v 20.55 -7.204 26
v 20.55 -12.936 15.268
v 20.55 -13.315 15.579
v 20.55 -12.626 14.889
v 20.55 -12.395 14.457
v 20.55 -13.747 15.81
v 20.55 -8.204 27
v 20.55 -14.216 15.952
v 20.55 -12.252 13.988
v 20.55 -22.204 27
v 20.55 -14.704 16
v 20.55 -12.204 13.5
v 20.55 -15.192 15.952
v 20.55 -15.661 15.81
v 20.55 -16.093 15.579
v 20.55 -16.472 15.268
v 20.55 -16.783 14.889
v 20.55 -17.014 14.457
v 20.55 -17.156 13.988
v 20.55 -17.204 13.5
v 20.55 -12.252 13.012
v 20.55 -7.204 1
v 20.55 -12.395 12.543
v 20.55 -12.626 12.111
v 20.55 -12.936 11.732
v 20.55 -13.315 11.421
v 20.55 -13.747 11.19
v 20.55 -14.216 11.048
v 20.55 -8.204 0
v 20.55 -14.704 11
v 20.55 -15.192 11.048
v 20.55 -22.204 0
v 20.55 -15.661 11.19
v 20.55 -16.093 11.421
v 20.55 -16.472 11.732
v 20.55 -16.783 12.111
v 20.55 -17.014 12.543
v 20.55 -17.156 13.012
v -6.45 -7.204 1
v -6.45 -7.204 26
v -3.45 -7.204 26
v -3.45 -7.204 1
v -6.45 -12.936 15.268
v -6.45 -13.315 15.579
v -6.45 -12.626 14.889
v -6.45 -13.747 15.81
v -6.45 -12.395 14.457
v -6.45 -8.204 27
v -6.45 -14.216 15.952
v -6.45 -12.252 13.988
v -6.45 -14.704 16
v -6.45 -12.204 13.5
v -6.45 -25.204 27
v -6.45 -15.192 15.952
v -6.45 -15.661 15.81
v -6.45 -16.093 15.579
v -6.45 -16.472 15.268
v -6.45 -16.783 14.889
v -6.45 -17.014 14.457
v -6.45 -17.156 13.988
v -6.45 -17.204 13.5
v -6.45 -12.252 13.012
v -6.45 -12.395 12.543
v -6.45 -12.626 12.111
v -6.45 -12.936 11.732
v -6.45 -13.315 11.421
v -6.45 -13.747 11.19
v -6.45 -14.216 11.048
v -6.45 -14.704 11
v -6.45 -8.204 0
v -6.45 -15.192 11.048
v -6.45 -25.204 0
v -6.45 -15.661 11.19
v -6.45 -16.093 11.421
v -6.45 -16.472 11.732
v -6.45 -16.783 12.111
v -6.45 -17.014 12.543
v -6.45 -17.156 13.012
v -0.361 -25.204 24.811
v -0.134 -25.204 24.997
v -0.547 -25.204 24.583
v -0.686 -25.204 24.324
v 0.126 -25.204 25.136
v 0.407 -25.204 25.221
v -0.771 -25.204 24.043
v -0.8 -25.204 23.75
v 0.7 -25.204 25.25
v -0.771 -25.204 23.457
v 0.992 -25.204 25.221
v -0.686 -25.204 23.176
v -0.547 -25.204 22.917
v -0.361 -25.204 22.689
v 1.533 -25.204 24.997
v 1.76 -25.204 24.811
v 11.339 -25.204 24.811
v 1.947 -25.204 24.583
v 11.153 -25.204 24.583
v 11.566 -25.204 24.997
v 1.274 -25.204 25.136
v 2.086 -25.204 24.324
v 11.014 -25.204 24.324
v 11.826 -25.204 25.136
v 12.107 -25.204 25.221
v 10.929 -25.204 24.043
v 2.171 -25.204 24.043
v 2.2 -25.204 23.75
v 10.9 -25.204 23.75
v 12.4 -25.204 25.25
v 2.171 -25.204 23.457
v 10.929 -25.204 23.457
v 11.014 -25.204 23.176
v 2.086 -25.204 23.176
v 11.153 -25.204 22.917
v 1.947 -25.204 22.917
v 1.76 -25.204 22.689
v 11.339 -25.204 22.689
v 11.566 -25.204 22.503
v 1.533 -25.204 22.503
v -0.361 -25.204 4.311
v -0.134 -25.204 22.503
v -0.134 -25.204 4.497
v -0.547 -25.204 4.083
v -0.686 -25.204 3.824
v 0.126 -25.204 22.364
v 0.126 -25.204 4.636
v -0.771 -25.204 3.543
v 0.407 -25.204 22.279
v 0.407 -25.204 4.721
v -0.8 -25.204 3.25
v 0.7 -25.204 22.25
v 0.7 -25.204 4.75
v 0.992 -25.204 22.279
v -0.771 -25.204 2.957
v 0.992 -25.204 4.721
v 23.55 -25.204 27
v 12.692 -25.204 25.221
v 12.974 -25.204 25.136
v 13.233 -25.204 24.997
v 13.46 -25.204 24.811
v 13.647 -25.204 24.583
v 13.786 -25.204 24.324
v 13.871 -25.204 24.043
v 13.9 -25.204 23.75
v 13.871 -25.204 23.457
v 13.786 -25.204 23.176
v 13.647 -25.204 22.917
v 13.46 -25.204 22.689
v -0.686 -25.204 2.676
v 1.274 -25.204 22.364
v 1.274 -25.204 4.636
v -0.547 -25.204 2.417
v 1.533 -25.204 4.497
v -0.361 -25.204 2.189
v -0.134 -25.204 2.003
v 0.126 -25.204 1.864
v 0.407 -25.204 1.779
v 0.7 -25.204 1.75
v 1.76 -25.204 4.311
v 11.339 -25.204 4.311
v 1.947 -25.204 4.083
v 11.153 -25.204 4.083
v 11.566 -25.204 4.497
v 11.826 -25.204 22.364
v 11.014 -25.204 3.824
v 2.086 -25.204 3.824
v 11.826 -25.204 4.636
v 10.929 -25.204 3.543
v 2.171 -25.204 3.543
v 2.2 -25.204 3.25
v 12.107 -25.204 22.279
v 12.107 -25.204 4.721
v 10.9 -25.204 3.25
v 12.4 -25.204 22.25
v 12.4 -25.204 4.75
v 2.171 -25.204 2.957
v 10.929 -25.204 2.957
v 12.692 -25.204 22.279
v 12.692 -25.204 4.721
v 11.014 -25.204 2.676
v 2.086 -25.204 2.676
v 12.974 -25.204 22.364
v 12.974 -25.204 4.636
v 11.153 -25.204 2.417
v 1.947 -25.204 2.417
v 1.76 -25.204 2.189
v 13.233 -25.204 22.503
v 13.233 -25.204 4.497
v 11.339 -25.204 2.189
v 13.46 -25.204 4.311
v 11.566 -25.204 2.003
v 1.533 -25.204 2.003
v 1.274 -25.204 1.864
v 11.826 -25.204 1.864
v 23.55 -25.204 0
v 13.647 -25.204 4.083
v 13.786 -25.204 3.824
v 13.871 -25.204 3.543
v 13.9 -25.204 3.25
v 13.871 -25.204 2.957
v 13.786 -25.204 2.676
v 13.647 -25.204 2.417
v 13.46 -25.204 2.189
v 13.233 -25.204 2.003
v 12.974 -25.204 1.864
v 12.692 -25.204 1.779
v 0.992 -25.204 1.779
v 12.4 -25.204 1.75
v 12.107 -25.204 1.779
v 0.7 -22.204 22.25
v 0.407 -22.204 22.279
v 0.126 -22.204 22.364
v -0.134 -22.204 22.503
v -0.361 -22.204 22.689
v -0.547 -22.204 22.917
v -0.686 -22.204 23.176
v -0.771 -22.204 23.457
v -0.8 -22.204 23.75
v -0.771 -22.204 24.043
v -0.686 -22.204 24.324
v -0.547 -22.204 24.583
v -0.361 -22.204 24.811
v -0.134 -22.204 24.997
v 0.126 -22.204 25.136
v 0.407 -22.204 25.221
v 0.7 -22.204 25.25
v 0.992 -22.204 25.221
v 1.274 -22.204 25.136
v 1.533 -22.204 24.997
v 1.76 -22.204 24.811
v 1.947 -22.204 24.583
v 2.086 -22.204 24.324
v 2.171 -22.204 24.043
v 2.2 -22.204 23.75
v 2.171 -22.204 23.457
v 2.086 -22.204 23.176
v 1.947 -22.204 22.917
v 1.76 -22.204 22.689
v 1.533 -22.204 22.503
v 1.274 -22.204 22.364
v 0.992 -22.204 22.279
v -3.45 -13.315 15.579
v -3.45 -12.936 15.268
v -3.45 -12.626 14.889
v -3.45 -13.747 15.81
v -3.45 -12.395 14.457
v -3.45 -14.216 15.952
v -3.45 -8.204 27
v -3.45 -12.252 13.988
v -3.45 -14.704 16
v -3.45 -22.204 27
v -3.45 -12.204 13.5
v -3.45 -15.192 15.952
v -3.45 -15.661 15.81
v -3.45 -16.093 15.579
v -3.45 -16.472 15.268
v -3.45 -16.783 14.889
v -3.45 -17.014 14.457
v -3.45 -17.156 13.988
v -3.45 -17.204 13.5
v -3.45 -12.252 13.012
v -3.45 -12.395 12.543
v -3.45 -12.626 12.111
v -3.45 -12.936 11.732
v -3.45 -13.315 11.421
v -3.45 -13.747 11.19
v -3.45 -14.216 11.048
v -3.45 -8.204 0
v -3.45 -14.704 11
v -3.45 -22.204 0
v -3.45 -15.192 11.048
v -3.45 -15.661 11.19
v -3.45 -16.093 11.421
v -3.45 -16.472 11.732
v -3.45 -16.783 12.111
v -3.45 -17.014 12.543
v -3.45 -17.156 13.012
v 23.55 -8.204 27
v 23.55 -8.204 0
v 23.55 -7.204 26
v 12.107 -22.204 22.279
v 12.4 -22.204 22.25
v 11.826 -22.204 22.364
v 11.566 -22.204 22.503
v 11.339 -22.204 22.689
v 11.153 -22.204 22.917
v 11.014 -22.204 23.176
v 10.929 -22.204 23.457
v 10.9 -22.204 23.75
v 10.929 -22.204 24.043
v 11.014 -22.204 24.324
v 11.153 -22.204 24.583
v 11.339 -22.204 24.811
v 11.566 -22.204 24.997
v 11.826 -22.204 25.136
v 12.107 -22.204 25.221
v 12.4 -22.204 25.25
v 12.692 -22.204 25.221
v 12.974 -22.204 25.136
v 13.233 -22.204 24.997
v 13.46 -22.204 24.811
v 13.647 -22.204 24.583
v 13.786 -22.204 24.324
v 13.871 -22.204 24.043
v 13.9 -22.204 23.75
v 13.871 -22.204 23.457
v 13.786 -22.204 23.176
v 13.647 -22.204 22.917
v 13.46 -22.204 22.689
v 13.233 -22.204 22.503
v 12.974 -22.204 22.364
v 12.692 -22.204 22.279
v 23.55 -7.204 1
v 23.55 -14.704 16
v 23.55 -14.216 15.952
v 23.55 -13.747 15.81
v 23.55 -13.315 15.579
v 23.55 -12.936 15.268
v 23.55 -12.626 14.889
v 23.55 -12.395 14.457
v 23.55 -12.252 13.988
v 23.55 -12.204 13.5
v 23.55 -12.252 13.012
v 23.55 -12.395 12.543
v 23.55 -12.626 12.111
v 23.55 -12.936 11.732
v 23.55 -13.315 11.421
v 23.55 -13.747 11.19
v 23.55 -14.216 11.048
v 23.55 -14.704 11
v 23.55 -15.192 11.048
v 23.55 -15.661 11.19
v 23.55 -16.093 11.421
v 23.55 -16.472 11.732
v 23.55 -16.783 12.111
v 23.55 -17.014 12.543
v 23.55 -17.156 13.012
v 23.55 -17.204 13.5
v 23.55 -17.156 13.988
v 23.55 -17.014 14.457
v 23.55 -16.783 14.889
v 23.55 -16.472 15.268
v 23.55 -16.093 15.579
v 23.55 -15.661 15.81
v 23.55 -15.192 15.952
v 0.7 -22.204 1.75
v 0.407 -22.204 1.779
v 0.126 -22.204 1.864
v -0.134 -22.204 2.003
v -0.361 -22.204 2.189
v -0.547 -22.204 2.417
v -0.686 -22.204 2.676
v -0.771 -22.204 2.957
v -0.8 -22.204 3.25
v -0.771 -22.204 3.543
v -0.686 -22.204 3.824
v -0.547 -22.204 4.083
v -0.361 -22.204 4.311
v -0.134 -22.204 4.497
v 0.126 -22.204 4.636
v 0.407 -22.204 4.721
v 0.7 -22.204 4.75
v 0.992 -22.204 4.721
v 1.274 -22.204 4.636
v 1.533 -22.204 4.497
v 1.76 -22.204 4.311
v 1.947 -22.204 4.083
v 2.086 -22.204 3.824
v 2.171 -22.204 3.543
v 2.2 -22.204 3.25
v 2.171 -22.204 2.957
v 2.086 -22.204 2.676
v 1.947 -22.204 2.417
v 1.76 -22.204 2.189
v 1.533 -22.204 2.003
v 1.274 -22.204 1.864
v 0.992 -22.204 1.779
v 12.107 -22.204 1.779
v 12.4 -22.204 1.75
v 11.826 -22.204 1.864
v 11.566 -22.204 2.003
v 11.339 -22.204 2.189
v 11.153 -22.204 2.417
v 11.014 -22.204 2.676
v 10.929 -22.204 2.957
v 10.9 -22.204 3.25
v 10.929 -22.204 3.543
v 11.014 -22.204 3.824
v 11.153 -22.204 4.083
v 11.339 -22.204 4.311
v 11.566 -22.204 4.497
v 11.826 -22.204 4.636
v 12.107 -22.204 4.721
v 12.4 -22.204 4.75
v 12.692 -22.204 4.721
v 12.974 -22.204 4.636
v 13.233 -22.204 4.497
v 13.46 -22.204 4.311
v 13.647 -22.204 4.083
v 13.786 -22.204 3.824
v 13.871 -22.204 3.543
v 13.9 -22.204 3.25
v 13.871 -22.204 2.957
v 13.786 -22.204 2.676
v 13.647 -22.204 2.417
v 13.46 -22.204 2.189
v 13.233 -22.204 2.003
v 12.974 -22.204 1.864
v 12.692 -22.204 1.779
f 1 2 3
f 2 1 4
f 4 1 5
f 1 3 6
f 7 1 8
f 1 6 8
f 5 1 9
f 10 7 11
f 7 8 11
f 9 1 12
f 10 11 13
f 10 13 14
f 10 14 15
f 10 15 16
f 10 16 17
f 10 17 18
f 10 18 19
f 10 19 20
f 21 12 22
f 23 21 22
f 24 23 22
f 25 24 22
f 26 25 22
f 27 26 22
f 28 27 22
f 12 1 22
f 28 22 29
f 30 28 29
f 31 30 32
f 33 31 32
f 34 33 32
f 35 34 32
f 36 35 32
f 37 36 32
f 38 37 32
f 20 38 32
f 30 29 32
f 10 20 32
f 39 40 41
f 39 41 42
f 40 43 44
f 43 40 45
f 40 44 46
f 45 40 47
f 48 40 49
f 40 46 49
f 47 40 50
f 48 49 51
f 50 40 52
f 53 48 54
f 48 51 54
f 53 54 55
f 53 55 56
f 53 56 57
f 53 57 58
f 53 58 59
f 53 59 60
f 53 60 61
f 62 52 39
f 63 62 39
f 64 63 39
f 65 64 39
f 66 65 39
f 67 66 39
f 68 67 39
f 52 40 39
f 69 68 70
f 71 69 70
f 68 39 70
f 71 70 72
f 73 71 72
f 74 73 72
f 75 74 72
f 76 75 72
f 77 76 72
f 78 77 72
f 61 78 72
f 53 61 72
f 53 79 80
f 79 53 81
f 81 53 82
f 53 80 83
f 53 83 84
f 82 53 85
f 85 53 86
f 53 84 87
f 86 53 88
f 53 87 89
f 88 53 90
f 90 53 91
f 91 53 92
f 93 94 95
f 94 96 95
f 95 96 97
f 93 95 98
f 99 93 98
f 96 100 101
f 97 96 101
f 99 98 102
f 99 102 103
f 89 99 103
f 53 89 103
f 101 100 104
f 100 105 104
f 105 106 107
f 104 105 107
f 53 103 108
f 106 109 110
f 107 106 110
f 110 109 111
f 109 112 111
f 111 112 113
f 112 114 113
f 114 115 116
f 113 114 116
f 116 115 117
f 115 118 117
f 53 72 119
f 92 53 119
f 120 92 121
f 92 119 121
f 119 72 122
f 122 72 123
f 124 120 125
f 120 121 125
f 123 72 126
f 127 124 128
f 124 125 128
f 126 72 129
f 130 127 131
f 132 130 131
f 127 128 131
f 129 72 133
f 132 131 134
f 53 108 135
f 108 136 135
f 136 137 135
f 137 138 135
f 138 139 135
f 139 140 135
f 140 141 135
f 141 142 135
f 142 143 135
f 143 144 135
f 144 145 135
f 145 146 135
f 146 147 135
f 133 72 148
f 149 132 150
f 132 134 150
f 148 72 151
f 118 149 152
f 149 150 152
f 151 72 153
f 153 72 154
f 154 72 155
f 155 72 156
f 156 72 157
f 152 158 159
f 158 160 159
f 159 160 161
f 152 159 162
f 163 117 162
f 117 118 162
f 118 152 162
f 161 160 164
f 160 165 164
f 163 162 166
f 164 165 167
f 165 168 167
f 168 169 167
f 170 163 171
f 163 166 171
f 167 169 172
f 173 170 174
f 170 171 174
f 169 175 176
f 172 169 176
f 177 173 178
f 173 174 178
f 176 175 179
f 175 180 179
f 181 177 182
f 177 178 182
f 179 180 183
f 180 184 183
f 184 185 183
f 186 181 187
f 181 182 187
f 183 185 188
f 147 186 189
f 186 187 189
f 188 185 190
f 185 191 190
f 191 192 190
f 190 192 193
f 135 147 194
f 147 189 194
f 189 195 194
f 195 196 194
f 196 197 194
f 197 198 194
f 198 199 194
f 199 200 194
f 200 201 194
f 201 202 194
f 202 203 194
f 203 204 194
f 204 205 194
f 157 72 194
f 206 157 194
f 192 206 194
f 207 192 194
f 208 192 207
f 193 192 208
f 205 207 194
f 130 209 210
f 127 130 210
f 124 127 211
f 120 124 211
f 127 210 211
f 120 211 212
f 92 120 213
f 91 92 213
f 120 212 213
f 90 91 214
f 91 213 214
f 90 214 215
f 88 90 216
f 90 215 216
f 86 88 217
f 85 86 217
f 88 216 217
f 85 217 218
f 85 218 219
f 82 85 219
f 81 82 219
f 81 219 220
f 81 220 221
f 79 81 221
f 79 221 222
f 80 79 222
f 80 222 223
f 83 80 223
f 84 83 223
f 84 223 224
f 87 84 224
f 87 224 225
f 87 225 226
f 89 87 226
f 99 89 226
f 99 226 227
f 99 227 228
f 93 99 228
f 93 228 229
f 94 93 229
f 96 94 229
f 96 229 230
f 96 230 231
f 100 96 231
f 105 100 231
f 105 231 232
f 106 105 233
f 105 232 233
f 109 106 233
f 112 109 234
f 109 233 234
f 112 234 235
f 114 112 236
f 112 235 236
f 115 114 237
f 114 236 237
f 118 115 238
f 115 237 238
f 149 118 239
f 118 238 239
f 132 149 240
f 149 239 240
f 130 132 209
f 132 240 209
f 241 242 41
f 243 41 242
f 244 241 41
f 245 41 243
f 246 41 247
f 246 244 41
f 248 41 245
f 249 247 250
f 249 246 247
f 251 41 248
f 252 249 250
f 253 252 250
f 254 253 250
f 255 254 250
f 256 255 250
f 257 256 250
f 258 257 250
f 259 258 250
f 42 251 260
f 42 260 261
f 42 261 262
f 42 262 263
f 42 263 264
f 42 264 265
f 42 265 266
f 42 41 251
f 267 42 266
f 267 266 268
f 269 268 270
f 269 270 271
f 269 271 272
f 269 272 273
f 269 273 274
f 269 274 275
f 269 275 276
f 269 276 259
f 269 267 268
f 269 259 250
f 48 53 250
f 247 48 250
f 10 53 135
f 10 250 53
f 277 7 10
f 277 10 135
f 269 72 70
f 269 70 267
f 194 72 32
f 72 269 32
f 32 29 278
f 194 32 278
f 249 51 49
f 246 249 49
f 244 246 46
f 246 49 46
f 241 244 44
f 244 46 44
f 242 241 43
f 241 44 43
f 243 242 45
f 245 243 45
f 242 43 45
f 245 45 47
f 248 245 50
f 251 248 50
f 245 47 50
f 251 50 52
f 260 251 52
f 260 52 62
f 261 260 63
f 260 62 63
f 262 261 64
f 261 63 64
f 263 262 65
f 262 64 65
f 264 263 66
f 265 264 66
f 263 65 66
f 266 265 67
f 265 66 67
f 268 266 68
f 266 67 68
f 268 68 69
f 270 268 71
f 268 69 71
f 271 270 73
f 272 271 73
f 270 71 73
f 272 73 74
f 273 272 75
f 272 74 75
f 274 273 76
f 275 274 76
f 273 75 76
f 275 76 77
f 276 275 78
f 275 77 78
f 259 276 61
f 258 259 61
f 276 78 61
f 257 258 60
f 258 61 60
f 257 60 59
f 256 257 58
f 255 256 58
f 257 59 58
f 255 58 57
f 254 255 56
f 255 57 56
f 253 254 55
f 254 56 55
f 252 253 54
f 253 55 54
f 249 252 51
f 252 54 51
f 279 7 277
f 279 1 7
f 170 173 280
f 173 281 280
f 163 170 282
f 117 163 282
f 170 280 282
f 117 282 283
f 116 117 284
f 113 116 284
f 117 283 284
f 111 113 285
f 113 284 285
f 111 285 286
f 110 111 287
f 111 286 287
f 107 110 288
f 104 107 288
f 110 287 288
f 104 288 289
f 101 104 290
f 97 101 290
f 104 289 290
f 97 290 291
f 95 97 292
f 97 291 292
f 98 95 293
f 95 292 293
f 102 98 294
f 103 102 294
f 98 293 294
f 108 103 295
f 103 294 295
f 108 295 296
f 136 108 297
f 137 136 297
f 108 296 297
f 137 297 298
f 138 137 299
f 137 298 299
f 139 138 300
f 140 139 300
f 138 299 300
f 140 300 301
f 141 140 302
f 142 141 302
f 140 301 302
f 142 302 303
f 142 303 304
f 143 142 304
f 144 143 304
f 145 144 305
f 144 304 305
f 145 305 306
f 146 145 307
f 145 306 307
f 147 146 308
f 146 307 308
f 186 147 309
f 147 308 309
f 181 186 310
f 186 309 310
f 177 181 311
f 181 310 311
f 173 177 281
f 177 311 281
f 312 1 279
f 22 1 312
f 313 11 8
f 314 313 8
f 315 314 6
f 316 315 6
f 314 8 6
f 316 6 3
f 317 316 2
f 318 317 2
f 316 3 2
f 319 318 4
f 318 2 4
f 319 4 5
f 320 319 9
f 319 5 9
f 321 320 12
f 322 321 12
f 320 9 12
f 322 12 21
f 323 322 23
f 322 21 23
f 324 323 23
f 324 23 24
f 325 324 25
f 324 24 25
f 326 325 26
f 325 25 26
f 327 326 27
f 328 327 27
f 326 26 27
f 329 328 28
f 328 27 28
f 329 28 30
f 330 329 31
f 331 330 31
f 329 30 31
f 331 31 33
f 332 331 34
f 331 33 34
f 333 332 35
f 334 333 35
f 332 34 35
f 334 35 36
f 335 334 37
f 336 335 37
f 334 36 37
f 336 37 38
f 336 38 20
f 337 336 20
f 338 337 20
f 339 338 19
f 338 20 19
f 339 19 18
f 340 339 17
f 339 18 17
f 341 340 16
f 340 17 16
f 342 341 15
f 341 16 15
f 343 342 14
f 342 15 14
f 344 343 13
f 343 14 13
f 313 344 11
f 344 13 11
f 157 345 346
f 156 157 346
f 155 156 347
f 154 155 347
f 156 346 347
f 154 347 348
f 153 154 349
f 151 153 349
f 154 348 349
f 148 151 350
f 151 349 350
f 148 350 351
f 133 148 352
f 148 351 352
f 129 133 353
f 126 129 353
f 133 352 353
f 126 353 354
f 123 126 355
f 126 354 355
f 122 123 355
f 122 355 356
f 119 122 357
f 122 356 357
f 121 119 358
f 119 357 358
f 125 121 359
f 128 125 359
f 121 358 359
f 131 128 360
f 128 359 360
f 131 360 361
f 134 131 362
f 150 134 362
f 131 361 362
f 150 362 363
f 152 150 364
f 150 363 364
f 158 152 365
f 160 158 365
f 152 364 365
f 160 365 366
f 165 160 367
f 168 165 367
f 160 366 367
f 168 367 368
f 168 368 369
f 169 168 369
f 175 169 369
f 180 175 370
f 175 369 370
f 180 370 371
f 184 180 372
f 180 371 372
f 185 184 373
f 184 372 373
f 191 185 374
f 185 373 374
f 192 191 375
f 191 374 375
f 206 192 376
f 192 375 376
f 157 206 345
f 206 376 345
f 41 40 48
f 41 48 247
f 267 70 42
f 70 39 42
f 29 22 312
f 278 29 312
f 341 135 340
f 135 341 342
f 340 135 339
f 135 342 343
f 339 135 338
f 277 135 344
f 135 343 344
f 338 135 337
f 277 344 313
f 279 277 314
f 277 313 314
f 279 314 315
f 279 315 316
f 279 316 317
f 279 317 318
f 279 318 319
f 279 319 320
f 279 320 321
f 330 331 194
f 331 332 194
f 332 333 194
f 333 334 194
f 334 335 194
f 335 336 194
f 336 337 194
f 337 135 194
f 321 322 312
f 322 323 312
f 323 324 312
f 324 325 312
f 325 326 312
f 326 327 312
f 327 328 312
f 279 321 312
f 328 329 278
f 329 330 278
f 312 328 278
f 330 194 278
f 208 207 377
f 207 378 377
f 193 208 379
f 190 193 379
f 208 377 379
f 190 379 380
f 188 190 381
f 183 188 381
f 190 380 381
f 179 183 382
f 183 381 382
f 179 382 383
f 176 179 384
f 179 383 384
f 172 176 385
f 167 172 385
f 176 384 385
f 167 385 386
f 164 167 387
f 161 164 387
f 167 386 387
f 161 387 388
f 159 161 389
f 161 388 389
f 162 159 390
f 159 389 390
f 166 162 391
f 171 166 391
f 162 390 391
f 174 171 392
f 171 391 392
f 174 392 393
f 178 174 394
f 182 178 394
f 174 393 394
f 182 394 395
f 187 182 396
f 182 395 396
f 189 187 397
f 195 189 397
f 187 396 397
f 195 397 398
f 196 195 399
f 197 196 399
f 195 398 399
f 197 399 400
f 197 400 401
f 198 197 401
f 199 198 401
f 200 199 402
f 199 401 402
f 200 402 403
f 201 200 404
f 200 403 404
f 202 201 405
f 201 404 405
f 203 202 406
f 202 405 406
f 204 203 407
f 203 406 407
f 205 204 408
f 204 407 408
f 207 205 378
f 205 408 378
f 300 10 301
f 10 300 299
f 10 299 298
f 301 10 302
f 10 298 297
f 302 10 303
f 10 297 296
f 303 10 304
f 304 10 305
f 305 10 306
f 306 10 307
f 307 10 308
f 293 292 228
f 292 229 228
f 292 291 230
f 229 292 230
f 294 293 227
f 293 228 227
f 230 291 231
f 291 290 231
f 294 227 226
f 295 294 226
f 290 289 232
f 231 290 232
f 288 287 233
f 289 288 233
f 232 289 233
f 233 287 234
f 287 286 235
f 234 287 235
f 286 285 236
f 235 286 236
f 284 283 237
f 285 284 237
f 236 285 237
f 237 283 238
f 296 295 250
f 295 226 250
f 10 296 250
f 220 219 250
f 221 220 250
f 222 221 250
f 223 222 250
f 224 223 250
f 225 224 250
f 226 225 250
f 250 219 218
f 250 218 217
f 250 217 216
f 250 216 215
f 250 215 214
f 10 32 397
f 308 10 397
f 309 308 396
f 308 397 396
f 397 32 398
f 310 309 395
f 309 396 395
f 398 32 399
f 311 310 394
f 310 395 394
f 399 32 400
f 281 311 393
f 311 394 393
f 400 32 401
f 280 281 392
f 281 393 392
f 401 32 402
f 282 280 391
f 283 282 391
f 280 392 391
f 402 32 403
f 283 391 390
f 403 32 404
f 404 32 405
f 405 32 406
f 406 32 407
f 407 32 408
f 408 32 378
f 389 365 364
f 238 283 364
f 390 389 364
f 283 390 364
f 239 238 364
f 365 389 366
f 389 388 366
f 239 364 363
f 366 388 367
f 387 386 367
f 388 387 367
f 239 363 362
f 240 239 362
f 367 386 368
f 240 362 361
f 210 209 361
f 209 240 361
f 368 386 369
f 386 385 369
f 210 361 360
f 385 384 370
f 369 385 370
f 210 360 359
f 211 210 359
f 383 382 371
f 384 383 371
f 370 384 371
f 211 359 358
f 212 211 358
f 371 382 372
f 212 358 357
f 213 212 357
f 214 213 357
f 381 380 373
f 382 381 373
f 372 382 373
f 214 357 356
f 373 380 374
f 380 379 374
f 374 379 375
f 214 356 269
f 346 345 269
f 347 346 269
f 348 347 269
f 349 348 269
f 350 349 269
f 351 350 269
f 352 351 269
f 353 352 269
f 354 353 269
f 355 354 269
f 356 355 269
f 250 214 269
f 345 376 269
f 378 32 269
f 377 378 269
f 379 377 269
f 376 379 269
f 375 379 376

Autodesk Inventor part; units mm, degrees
ref_plane "YZ Plane" through (0, 0, 0) normal (1, 0, 0) x (0, 1, 0)
ref_plane "XZ Plane" through (0, 0, 0) normal (0, 1, 0) x (-1, 0, 0)
ref_plane "XY Plane" through (0, 0, 0) normal (0, 0, 1) x (1, 0, 0)
sketch "Szkic1" plane through (0, 0, 0) normal (0, 0, 1) x (1, 0, 0)
  line L0 (-6.4502, 4.7958) -> (-6.4502, -25.2042)
  line L1 (-6.4502, -25.2042) -> (23.5498, -25.2042)
  line L2 (23.5498, -25.2042) -> (23.5498, 4.7958)
  line L3 (-6.4502, 4.7958) -> (-3.4502, 4.7958)
  line L4 (-3.4502, 4.7958) -> (-3.4502, -22.2042)
  line L5 (23.5498, 4.7958) -> (20.5498, 4.7958)
  line L6 (20.5498, 4.7958) -> (20.5498, -22.2042)
  line L7 (20.5498, -22.2042) -> (-3.4502, -22.2042)
  point P0 (0, 0)
  dimension "d0" = 30
  dimension "d1" = 30
  dimension "d2" = 30
  dimension "d3" = 3
  dimension "d4" = 27
  dimension "d5" = 3
extrude "Wyciągnięcie proste1" add sketch "Szkic1" along normal blind 27
sketch "Szkic2" plane through (-6.4502, -25.2042, 0) normal (-1, 0, 0) x (0, 0, 1)
  line L0 (0, 30) -> (0, 0) projected
  line L1 (0, 0) -> (27, 0) projected
  line L2 (27, 30) -> (27, 0) projected
  line L3 (0, 30) -> (27, 30) projected
  line L4 (0, 3) -> (27, 3) projected
  circle A0 centre (13.5, 10.5) radius 2.5
  line L5 (27, 30) -> (27, 0) projected
  line L6 (27, 18) -> (0, 18)
  point P0 (0, 25.2042)
  dimension "d8" = 27
  dimension "d9" = 13.5
  dimension "d10" = 5
  dimension "d11" = 7.5
  dimension "d12" = 7.5
extrude "Wyciągnięcie proste2" cut sketch "Szkic2" against normal through all contours L3 L2 L6 L0 | A0
chamfer "Faza2" distance 1 angle 45 4 edges at (22.0498, -7.2042, 27) (-4.9502, -7.2042, 27) (22.0498, -7.2042, 0) (-4.9502, -7.2042, 0)
sketch "Szkic5" plane through (-6.4502, -25.2042, 0) normal (0, -1, 0) x (1, 0, 0)
  line L0 (0, 0) -> (30, 0) projected
  line L1 (30, 0) -> (30, 27) projected
  line L2 (0, 27) -> (30, 27) projected
  line L3 (0, 0) -> (0, 27) projected
  line L4 (3, 0) -> (3, 27) projected
  line L5 (27, 0) -> (27, 27) projected
  point P0 (6.4502, 0)
  point P1 (7.15, 23.75)
  point P2 (18.85, 23.75)
  point P3 (7.15, 3.25)
  point P4 (18.85, 3.25)
  dimension "d21" = 20.5
  dimension "d22" = 11.7
  dimension "d24" = 11.7
  dimension "d25" = 20.5
  dimension "d26" = 27
  dimension "d27" = 3.25
  dimension "d28" = 22.85
hole "Otwór1" at (0.6998, -25.2042, 23.75) at (12.3998, -25.2042, 23.75) at (0.6998, -25.2042, 3.25) at (12.3998, -25.2042, 3.25) direction (0, 1, 0) diameter 3 end through all
equation "\"d9\" = 0.5 * d8"
equation "\"d12\" = d11"
equation "\"d27\" = -0.5 * d21 + 0.5 * d26"
properties part number "CNCM_ALU_Y_Axis_Tensioning_System_C_Sec"
